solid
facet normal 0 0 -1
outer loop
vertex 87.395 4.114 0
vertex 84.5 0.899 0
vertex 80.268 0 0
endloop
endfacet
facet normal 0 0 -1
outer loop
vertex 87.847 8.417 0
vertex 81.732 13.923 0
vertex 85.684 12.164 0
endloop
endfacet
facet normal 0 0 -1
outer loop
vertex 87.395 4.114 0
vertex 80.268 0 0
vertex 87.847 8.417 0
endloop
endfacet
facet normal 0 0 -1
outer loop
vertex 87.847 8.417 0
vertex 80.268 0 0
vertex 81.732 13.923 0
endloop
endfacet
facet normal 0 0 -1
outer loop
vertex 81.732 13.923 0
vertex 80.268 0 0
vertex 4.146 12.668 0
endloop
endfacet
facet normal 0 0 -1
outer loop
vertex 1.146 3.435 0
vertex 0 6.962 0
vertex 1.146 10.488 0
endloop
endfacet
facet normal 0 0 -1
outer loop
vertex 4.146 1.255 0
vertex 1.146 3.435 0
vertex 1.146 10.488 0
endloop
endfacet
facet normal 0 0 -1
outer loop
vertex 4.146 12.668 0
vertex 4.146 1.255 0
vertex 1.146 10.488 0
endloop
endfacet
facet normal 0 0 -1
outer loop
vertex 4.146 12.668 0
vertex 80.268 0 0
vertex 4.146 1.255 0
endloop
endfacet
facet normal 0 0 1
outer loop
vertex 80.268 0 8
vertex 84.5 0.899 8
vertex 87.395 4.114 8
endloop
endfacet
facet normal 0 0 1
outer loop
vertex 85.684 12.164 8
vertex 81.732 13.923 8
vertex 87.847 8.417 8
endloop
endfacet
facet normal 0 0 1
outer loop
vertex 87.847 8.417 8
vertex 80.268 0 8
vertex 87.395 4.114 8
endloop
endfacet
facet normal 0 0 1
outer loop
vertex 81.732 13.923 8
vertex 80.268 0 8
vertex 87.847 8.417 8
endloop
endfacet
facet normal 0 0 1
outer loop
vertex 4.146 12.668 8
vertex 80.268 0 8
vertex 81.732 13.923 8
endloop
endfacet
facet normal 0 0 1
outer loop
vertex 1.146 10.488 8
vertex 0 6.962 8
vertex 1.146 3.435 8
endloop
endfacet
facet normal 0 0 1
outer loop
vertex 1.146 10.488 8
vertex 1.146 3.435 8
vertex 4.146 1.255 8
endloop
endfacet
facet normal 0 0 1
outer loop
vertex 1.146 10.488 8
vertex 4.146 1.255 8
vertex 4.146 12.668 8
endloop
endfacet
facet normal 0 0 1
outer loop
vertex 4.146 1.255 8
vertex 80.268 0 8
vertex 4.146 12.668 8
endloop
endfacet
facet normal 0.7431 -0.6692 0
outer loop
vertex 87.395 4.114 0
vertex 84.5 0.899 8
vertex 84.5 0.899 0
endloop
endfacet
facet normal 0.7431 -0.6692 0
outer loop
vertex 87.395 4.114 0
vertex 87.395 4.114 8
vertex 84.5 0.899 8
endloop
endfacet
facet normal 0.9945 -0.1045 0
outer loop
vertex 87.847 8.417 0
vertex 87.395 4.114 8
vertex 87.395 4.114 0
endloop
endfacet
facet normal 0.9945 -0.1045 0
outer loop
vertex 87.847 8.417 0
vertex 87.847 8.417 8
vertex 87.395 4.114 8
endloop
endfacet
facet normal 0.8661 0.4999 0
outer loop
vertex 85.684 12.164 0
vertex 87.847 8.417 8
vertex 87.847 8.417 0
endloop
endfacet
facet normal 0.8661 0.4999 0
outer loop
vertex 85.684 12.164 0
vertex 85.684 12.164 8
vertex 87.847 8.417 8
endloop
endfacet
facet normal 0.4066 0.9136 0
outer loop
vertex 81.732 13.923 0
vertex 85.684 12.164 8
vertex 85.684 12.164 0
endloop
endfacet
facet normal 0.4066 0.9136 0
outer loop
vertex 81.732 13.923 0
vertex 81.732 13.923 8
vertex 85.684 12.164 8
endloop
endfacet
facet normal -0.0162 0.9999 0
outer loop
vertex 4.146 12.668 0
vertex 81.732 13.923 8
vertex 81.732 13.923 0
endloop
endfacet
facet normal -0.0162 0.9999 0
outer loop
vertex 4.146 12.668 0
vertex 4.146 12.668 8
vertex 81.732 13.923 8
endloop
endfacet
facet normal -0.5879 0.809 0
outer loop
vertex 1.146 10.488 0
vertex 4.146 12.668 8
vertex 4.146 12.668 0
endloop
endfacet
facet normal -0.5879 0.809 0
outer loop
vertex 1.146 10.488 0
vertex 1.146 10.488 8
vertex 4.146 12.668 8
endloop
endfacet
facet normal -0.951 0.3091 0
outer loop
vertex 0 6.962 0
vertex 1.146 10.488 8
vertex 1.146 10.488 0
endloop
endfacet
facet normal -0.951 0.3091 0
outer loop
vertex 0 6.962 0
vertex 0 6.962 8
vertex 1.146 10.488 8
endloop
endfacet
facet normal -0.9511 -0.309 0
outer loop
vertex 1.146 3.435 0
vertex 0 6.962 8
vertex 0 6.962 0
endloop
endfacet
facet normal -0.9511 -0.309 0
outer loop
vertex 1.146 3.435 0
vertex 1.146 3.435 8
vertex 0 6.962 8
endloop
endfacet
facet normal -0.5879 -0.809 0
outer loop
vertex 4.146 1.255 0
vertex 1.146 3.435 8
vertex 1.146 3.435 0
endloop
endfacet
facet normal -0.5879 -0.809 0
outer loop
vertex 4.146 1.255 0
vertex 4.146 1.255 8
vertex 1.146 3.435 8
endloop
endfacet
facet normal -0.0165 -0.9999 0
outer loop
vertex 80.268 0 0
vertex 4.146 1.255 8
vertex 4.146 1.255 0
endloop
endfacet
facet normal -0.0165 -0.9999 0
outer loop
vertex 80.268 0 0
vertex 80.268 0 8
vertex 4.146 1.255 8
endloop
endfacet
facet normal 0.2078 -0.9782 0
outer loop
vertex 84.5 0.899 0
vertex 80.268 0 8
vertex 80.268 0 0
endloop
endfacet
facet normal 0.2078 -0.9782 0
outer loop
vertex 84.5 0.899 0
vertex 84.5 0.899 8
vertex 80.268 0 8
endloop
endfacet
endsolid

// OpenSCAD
$fn = 32;

// ----------------------------------------------------------------------
// Lever arm: two bosses 12 and 14 mm, 75 mm between centres
// ----------------------------------------------------------------------

// --- parameters (mm) ---
profile_height = 8;       // extrusion height
profile_points = 11;      // points of the closed outline

profile = [[0, 6.962], [1.146, 3.435], [4.146, 1.255], [80.268, 0], [84.5, 0.899], [87.395, 4.114], [87.847, 8.417], [85.684, 12.164], [81.732, 13.923], [4.146, 12.668], [1.146, 10.488]];  // single closed polygon, 11 points, counter clockwise

// --- the one profile operation ---
linear_extrude(height = profile_height) polygon(points = profile);
